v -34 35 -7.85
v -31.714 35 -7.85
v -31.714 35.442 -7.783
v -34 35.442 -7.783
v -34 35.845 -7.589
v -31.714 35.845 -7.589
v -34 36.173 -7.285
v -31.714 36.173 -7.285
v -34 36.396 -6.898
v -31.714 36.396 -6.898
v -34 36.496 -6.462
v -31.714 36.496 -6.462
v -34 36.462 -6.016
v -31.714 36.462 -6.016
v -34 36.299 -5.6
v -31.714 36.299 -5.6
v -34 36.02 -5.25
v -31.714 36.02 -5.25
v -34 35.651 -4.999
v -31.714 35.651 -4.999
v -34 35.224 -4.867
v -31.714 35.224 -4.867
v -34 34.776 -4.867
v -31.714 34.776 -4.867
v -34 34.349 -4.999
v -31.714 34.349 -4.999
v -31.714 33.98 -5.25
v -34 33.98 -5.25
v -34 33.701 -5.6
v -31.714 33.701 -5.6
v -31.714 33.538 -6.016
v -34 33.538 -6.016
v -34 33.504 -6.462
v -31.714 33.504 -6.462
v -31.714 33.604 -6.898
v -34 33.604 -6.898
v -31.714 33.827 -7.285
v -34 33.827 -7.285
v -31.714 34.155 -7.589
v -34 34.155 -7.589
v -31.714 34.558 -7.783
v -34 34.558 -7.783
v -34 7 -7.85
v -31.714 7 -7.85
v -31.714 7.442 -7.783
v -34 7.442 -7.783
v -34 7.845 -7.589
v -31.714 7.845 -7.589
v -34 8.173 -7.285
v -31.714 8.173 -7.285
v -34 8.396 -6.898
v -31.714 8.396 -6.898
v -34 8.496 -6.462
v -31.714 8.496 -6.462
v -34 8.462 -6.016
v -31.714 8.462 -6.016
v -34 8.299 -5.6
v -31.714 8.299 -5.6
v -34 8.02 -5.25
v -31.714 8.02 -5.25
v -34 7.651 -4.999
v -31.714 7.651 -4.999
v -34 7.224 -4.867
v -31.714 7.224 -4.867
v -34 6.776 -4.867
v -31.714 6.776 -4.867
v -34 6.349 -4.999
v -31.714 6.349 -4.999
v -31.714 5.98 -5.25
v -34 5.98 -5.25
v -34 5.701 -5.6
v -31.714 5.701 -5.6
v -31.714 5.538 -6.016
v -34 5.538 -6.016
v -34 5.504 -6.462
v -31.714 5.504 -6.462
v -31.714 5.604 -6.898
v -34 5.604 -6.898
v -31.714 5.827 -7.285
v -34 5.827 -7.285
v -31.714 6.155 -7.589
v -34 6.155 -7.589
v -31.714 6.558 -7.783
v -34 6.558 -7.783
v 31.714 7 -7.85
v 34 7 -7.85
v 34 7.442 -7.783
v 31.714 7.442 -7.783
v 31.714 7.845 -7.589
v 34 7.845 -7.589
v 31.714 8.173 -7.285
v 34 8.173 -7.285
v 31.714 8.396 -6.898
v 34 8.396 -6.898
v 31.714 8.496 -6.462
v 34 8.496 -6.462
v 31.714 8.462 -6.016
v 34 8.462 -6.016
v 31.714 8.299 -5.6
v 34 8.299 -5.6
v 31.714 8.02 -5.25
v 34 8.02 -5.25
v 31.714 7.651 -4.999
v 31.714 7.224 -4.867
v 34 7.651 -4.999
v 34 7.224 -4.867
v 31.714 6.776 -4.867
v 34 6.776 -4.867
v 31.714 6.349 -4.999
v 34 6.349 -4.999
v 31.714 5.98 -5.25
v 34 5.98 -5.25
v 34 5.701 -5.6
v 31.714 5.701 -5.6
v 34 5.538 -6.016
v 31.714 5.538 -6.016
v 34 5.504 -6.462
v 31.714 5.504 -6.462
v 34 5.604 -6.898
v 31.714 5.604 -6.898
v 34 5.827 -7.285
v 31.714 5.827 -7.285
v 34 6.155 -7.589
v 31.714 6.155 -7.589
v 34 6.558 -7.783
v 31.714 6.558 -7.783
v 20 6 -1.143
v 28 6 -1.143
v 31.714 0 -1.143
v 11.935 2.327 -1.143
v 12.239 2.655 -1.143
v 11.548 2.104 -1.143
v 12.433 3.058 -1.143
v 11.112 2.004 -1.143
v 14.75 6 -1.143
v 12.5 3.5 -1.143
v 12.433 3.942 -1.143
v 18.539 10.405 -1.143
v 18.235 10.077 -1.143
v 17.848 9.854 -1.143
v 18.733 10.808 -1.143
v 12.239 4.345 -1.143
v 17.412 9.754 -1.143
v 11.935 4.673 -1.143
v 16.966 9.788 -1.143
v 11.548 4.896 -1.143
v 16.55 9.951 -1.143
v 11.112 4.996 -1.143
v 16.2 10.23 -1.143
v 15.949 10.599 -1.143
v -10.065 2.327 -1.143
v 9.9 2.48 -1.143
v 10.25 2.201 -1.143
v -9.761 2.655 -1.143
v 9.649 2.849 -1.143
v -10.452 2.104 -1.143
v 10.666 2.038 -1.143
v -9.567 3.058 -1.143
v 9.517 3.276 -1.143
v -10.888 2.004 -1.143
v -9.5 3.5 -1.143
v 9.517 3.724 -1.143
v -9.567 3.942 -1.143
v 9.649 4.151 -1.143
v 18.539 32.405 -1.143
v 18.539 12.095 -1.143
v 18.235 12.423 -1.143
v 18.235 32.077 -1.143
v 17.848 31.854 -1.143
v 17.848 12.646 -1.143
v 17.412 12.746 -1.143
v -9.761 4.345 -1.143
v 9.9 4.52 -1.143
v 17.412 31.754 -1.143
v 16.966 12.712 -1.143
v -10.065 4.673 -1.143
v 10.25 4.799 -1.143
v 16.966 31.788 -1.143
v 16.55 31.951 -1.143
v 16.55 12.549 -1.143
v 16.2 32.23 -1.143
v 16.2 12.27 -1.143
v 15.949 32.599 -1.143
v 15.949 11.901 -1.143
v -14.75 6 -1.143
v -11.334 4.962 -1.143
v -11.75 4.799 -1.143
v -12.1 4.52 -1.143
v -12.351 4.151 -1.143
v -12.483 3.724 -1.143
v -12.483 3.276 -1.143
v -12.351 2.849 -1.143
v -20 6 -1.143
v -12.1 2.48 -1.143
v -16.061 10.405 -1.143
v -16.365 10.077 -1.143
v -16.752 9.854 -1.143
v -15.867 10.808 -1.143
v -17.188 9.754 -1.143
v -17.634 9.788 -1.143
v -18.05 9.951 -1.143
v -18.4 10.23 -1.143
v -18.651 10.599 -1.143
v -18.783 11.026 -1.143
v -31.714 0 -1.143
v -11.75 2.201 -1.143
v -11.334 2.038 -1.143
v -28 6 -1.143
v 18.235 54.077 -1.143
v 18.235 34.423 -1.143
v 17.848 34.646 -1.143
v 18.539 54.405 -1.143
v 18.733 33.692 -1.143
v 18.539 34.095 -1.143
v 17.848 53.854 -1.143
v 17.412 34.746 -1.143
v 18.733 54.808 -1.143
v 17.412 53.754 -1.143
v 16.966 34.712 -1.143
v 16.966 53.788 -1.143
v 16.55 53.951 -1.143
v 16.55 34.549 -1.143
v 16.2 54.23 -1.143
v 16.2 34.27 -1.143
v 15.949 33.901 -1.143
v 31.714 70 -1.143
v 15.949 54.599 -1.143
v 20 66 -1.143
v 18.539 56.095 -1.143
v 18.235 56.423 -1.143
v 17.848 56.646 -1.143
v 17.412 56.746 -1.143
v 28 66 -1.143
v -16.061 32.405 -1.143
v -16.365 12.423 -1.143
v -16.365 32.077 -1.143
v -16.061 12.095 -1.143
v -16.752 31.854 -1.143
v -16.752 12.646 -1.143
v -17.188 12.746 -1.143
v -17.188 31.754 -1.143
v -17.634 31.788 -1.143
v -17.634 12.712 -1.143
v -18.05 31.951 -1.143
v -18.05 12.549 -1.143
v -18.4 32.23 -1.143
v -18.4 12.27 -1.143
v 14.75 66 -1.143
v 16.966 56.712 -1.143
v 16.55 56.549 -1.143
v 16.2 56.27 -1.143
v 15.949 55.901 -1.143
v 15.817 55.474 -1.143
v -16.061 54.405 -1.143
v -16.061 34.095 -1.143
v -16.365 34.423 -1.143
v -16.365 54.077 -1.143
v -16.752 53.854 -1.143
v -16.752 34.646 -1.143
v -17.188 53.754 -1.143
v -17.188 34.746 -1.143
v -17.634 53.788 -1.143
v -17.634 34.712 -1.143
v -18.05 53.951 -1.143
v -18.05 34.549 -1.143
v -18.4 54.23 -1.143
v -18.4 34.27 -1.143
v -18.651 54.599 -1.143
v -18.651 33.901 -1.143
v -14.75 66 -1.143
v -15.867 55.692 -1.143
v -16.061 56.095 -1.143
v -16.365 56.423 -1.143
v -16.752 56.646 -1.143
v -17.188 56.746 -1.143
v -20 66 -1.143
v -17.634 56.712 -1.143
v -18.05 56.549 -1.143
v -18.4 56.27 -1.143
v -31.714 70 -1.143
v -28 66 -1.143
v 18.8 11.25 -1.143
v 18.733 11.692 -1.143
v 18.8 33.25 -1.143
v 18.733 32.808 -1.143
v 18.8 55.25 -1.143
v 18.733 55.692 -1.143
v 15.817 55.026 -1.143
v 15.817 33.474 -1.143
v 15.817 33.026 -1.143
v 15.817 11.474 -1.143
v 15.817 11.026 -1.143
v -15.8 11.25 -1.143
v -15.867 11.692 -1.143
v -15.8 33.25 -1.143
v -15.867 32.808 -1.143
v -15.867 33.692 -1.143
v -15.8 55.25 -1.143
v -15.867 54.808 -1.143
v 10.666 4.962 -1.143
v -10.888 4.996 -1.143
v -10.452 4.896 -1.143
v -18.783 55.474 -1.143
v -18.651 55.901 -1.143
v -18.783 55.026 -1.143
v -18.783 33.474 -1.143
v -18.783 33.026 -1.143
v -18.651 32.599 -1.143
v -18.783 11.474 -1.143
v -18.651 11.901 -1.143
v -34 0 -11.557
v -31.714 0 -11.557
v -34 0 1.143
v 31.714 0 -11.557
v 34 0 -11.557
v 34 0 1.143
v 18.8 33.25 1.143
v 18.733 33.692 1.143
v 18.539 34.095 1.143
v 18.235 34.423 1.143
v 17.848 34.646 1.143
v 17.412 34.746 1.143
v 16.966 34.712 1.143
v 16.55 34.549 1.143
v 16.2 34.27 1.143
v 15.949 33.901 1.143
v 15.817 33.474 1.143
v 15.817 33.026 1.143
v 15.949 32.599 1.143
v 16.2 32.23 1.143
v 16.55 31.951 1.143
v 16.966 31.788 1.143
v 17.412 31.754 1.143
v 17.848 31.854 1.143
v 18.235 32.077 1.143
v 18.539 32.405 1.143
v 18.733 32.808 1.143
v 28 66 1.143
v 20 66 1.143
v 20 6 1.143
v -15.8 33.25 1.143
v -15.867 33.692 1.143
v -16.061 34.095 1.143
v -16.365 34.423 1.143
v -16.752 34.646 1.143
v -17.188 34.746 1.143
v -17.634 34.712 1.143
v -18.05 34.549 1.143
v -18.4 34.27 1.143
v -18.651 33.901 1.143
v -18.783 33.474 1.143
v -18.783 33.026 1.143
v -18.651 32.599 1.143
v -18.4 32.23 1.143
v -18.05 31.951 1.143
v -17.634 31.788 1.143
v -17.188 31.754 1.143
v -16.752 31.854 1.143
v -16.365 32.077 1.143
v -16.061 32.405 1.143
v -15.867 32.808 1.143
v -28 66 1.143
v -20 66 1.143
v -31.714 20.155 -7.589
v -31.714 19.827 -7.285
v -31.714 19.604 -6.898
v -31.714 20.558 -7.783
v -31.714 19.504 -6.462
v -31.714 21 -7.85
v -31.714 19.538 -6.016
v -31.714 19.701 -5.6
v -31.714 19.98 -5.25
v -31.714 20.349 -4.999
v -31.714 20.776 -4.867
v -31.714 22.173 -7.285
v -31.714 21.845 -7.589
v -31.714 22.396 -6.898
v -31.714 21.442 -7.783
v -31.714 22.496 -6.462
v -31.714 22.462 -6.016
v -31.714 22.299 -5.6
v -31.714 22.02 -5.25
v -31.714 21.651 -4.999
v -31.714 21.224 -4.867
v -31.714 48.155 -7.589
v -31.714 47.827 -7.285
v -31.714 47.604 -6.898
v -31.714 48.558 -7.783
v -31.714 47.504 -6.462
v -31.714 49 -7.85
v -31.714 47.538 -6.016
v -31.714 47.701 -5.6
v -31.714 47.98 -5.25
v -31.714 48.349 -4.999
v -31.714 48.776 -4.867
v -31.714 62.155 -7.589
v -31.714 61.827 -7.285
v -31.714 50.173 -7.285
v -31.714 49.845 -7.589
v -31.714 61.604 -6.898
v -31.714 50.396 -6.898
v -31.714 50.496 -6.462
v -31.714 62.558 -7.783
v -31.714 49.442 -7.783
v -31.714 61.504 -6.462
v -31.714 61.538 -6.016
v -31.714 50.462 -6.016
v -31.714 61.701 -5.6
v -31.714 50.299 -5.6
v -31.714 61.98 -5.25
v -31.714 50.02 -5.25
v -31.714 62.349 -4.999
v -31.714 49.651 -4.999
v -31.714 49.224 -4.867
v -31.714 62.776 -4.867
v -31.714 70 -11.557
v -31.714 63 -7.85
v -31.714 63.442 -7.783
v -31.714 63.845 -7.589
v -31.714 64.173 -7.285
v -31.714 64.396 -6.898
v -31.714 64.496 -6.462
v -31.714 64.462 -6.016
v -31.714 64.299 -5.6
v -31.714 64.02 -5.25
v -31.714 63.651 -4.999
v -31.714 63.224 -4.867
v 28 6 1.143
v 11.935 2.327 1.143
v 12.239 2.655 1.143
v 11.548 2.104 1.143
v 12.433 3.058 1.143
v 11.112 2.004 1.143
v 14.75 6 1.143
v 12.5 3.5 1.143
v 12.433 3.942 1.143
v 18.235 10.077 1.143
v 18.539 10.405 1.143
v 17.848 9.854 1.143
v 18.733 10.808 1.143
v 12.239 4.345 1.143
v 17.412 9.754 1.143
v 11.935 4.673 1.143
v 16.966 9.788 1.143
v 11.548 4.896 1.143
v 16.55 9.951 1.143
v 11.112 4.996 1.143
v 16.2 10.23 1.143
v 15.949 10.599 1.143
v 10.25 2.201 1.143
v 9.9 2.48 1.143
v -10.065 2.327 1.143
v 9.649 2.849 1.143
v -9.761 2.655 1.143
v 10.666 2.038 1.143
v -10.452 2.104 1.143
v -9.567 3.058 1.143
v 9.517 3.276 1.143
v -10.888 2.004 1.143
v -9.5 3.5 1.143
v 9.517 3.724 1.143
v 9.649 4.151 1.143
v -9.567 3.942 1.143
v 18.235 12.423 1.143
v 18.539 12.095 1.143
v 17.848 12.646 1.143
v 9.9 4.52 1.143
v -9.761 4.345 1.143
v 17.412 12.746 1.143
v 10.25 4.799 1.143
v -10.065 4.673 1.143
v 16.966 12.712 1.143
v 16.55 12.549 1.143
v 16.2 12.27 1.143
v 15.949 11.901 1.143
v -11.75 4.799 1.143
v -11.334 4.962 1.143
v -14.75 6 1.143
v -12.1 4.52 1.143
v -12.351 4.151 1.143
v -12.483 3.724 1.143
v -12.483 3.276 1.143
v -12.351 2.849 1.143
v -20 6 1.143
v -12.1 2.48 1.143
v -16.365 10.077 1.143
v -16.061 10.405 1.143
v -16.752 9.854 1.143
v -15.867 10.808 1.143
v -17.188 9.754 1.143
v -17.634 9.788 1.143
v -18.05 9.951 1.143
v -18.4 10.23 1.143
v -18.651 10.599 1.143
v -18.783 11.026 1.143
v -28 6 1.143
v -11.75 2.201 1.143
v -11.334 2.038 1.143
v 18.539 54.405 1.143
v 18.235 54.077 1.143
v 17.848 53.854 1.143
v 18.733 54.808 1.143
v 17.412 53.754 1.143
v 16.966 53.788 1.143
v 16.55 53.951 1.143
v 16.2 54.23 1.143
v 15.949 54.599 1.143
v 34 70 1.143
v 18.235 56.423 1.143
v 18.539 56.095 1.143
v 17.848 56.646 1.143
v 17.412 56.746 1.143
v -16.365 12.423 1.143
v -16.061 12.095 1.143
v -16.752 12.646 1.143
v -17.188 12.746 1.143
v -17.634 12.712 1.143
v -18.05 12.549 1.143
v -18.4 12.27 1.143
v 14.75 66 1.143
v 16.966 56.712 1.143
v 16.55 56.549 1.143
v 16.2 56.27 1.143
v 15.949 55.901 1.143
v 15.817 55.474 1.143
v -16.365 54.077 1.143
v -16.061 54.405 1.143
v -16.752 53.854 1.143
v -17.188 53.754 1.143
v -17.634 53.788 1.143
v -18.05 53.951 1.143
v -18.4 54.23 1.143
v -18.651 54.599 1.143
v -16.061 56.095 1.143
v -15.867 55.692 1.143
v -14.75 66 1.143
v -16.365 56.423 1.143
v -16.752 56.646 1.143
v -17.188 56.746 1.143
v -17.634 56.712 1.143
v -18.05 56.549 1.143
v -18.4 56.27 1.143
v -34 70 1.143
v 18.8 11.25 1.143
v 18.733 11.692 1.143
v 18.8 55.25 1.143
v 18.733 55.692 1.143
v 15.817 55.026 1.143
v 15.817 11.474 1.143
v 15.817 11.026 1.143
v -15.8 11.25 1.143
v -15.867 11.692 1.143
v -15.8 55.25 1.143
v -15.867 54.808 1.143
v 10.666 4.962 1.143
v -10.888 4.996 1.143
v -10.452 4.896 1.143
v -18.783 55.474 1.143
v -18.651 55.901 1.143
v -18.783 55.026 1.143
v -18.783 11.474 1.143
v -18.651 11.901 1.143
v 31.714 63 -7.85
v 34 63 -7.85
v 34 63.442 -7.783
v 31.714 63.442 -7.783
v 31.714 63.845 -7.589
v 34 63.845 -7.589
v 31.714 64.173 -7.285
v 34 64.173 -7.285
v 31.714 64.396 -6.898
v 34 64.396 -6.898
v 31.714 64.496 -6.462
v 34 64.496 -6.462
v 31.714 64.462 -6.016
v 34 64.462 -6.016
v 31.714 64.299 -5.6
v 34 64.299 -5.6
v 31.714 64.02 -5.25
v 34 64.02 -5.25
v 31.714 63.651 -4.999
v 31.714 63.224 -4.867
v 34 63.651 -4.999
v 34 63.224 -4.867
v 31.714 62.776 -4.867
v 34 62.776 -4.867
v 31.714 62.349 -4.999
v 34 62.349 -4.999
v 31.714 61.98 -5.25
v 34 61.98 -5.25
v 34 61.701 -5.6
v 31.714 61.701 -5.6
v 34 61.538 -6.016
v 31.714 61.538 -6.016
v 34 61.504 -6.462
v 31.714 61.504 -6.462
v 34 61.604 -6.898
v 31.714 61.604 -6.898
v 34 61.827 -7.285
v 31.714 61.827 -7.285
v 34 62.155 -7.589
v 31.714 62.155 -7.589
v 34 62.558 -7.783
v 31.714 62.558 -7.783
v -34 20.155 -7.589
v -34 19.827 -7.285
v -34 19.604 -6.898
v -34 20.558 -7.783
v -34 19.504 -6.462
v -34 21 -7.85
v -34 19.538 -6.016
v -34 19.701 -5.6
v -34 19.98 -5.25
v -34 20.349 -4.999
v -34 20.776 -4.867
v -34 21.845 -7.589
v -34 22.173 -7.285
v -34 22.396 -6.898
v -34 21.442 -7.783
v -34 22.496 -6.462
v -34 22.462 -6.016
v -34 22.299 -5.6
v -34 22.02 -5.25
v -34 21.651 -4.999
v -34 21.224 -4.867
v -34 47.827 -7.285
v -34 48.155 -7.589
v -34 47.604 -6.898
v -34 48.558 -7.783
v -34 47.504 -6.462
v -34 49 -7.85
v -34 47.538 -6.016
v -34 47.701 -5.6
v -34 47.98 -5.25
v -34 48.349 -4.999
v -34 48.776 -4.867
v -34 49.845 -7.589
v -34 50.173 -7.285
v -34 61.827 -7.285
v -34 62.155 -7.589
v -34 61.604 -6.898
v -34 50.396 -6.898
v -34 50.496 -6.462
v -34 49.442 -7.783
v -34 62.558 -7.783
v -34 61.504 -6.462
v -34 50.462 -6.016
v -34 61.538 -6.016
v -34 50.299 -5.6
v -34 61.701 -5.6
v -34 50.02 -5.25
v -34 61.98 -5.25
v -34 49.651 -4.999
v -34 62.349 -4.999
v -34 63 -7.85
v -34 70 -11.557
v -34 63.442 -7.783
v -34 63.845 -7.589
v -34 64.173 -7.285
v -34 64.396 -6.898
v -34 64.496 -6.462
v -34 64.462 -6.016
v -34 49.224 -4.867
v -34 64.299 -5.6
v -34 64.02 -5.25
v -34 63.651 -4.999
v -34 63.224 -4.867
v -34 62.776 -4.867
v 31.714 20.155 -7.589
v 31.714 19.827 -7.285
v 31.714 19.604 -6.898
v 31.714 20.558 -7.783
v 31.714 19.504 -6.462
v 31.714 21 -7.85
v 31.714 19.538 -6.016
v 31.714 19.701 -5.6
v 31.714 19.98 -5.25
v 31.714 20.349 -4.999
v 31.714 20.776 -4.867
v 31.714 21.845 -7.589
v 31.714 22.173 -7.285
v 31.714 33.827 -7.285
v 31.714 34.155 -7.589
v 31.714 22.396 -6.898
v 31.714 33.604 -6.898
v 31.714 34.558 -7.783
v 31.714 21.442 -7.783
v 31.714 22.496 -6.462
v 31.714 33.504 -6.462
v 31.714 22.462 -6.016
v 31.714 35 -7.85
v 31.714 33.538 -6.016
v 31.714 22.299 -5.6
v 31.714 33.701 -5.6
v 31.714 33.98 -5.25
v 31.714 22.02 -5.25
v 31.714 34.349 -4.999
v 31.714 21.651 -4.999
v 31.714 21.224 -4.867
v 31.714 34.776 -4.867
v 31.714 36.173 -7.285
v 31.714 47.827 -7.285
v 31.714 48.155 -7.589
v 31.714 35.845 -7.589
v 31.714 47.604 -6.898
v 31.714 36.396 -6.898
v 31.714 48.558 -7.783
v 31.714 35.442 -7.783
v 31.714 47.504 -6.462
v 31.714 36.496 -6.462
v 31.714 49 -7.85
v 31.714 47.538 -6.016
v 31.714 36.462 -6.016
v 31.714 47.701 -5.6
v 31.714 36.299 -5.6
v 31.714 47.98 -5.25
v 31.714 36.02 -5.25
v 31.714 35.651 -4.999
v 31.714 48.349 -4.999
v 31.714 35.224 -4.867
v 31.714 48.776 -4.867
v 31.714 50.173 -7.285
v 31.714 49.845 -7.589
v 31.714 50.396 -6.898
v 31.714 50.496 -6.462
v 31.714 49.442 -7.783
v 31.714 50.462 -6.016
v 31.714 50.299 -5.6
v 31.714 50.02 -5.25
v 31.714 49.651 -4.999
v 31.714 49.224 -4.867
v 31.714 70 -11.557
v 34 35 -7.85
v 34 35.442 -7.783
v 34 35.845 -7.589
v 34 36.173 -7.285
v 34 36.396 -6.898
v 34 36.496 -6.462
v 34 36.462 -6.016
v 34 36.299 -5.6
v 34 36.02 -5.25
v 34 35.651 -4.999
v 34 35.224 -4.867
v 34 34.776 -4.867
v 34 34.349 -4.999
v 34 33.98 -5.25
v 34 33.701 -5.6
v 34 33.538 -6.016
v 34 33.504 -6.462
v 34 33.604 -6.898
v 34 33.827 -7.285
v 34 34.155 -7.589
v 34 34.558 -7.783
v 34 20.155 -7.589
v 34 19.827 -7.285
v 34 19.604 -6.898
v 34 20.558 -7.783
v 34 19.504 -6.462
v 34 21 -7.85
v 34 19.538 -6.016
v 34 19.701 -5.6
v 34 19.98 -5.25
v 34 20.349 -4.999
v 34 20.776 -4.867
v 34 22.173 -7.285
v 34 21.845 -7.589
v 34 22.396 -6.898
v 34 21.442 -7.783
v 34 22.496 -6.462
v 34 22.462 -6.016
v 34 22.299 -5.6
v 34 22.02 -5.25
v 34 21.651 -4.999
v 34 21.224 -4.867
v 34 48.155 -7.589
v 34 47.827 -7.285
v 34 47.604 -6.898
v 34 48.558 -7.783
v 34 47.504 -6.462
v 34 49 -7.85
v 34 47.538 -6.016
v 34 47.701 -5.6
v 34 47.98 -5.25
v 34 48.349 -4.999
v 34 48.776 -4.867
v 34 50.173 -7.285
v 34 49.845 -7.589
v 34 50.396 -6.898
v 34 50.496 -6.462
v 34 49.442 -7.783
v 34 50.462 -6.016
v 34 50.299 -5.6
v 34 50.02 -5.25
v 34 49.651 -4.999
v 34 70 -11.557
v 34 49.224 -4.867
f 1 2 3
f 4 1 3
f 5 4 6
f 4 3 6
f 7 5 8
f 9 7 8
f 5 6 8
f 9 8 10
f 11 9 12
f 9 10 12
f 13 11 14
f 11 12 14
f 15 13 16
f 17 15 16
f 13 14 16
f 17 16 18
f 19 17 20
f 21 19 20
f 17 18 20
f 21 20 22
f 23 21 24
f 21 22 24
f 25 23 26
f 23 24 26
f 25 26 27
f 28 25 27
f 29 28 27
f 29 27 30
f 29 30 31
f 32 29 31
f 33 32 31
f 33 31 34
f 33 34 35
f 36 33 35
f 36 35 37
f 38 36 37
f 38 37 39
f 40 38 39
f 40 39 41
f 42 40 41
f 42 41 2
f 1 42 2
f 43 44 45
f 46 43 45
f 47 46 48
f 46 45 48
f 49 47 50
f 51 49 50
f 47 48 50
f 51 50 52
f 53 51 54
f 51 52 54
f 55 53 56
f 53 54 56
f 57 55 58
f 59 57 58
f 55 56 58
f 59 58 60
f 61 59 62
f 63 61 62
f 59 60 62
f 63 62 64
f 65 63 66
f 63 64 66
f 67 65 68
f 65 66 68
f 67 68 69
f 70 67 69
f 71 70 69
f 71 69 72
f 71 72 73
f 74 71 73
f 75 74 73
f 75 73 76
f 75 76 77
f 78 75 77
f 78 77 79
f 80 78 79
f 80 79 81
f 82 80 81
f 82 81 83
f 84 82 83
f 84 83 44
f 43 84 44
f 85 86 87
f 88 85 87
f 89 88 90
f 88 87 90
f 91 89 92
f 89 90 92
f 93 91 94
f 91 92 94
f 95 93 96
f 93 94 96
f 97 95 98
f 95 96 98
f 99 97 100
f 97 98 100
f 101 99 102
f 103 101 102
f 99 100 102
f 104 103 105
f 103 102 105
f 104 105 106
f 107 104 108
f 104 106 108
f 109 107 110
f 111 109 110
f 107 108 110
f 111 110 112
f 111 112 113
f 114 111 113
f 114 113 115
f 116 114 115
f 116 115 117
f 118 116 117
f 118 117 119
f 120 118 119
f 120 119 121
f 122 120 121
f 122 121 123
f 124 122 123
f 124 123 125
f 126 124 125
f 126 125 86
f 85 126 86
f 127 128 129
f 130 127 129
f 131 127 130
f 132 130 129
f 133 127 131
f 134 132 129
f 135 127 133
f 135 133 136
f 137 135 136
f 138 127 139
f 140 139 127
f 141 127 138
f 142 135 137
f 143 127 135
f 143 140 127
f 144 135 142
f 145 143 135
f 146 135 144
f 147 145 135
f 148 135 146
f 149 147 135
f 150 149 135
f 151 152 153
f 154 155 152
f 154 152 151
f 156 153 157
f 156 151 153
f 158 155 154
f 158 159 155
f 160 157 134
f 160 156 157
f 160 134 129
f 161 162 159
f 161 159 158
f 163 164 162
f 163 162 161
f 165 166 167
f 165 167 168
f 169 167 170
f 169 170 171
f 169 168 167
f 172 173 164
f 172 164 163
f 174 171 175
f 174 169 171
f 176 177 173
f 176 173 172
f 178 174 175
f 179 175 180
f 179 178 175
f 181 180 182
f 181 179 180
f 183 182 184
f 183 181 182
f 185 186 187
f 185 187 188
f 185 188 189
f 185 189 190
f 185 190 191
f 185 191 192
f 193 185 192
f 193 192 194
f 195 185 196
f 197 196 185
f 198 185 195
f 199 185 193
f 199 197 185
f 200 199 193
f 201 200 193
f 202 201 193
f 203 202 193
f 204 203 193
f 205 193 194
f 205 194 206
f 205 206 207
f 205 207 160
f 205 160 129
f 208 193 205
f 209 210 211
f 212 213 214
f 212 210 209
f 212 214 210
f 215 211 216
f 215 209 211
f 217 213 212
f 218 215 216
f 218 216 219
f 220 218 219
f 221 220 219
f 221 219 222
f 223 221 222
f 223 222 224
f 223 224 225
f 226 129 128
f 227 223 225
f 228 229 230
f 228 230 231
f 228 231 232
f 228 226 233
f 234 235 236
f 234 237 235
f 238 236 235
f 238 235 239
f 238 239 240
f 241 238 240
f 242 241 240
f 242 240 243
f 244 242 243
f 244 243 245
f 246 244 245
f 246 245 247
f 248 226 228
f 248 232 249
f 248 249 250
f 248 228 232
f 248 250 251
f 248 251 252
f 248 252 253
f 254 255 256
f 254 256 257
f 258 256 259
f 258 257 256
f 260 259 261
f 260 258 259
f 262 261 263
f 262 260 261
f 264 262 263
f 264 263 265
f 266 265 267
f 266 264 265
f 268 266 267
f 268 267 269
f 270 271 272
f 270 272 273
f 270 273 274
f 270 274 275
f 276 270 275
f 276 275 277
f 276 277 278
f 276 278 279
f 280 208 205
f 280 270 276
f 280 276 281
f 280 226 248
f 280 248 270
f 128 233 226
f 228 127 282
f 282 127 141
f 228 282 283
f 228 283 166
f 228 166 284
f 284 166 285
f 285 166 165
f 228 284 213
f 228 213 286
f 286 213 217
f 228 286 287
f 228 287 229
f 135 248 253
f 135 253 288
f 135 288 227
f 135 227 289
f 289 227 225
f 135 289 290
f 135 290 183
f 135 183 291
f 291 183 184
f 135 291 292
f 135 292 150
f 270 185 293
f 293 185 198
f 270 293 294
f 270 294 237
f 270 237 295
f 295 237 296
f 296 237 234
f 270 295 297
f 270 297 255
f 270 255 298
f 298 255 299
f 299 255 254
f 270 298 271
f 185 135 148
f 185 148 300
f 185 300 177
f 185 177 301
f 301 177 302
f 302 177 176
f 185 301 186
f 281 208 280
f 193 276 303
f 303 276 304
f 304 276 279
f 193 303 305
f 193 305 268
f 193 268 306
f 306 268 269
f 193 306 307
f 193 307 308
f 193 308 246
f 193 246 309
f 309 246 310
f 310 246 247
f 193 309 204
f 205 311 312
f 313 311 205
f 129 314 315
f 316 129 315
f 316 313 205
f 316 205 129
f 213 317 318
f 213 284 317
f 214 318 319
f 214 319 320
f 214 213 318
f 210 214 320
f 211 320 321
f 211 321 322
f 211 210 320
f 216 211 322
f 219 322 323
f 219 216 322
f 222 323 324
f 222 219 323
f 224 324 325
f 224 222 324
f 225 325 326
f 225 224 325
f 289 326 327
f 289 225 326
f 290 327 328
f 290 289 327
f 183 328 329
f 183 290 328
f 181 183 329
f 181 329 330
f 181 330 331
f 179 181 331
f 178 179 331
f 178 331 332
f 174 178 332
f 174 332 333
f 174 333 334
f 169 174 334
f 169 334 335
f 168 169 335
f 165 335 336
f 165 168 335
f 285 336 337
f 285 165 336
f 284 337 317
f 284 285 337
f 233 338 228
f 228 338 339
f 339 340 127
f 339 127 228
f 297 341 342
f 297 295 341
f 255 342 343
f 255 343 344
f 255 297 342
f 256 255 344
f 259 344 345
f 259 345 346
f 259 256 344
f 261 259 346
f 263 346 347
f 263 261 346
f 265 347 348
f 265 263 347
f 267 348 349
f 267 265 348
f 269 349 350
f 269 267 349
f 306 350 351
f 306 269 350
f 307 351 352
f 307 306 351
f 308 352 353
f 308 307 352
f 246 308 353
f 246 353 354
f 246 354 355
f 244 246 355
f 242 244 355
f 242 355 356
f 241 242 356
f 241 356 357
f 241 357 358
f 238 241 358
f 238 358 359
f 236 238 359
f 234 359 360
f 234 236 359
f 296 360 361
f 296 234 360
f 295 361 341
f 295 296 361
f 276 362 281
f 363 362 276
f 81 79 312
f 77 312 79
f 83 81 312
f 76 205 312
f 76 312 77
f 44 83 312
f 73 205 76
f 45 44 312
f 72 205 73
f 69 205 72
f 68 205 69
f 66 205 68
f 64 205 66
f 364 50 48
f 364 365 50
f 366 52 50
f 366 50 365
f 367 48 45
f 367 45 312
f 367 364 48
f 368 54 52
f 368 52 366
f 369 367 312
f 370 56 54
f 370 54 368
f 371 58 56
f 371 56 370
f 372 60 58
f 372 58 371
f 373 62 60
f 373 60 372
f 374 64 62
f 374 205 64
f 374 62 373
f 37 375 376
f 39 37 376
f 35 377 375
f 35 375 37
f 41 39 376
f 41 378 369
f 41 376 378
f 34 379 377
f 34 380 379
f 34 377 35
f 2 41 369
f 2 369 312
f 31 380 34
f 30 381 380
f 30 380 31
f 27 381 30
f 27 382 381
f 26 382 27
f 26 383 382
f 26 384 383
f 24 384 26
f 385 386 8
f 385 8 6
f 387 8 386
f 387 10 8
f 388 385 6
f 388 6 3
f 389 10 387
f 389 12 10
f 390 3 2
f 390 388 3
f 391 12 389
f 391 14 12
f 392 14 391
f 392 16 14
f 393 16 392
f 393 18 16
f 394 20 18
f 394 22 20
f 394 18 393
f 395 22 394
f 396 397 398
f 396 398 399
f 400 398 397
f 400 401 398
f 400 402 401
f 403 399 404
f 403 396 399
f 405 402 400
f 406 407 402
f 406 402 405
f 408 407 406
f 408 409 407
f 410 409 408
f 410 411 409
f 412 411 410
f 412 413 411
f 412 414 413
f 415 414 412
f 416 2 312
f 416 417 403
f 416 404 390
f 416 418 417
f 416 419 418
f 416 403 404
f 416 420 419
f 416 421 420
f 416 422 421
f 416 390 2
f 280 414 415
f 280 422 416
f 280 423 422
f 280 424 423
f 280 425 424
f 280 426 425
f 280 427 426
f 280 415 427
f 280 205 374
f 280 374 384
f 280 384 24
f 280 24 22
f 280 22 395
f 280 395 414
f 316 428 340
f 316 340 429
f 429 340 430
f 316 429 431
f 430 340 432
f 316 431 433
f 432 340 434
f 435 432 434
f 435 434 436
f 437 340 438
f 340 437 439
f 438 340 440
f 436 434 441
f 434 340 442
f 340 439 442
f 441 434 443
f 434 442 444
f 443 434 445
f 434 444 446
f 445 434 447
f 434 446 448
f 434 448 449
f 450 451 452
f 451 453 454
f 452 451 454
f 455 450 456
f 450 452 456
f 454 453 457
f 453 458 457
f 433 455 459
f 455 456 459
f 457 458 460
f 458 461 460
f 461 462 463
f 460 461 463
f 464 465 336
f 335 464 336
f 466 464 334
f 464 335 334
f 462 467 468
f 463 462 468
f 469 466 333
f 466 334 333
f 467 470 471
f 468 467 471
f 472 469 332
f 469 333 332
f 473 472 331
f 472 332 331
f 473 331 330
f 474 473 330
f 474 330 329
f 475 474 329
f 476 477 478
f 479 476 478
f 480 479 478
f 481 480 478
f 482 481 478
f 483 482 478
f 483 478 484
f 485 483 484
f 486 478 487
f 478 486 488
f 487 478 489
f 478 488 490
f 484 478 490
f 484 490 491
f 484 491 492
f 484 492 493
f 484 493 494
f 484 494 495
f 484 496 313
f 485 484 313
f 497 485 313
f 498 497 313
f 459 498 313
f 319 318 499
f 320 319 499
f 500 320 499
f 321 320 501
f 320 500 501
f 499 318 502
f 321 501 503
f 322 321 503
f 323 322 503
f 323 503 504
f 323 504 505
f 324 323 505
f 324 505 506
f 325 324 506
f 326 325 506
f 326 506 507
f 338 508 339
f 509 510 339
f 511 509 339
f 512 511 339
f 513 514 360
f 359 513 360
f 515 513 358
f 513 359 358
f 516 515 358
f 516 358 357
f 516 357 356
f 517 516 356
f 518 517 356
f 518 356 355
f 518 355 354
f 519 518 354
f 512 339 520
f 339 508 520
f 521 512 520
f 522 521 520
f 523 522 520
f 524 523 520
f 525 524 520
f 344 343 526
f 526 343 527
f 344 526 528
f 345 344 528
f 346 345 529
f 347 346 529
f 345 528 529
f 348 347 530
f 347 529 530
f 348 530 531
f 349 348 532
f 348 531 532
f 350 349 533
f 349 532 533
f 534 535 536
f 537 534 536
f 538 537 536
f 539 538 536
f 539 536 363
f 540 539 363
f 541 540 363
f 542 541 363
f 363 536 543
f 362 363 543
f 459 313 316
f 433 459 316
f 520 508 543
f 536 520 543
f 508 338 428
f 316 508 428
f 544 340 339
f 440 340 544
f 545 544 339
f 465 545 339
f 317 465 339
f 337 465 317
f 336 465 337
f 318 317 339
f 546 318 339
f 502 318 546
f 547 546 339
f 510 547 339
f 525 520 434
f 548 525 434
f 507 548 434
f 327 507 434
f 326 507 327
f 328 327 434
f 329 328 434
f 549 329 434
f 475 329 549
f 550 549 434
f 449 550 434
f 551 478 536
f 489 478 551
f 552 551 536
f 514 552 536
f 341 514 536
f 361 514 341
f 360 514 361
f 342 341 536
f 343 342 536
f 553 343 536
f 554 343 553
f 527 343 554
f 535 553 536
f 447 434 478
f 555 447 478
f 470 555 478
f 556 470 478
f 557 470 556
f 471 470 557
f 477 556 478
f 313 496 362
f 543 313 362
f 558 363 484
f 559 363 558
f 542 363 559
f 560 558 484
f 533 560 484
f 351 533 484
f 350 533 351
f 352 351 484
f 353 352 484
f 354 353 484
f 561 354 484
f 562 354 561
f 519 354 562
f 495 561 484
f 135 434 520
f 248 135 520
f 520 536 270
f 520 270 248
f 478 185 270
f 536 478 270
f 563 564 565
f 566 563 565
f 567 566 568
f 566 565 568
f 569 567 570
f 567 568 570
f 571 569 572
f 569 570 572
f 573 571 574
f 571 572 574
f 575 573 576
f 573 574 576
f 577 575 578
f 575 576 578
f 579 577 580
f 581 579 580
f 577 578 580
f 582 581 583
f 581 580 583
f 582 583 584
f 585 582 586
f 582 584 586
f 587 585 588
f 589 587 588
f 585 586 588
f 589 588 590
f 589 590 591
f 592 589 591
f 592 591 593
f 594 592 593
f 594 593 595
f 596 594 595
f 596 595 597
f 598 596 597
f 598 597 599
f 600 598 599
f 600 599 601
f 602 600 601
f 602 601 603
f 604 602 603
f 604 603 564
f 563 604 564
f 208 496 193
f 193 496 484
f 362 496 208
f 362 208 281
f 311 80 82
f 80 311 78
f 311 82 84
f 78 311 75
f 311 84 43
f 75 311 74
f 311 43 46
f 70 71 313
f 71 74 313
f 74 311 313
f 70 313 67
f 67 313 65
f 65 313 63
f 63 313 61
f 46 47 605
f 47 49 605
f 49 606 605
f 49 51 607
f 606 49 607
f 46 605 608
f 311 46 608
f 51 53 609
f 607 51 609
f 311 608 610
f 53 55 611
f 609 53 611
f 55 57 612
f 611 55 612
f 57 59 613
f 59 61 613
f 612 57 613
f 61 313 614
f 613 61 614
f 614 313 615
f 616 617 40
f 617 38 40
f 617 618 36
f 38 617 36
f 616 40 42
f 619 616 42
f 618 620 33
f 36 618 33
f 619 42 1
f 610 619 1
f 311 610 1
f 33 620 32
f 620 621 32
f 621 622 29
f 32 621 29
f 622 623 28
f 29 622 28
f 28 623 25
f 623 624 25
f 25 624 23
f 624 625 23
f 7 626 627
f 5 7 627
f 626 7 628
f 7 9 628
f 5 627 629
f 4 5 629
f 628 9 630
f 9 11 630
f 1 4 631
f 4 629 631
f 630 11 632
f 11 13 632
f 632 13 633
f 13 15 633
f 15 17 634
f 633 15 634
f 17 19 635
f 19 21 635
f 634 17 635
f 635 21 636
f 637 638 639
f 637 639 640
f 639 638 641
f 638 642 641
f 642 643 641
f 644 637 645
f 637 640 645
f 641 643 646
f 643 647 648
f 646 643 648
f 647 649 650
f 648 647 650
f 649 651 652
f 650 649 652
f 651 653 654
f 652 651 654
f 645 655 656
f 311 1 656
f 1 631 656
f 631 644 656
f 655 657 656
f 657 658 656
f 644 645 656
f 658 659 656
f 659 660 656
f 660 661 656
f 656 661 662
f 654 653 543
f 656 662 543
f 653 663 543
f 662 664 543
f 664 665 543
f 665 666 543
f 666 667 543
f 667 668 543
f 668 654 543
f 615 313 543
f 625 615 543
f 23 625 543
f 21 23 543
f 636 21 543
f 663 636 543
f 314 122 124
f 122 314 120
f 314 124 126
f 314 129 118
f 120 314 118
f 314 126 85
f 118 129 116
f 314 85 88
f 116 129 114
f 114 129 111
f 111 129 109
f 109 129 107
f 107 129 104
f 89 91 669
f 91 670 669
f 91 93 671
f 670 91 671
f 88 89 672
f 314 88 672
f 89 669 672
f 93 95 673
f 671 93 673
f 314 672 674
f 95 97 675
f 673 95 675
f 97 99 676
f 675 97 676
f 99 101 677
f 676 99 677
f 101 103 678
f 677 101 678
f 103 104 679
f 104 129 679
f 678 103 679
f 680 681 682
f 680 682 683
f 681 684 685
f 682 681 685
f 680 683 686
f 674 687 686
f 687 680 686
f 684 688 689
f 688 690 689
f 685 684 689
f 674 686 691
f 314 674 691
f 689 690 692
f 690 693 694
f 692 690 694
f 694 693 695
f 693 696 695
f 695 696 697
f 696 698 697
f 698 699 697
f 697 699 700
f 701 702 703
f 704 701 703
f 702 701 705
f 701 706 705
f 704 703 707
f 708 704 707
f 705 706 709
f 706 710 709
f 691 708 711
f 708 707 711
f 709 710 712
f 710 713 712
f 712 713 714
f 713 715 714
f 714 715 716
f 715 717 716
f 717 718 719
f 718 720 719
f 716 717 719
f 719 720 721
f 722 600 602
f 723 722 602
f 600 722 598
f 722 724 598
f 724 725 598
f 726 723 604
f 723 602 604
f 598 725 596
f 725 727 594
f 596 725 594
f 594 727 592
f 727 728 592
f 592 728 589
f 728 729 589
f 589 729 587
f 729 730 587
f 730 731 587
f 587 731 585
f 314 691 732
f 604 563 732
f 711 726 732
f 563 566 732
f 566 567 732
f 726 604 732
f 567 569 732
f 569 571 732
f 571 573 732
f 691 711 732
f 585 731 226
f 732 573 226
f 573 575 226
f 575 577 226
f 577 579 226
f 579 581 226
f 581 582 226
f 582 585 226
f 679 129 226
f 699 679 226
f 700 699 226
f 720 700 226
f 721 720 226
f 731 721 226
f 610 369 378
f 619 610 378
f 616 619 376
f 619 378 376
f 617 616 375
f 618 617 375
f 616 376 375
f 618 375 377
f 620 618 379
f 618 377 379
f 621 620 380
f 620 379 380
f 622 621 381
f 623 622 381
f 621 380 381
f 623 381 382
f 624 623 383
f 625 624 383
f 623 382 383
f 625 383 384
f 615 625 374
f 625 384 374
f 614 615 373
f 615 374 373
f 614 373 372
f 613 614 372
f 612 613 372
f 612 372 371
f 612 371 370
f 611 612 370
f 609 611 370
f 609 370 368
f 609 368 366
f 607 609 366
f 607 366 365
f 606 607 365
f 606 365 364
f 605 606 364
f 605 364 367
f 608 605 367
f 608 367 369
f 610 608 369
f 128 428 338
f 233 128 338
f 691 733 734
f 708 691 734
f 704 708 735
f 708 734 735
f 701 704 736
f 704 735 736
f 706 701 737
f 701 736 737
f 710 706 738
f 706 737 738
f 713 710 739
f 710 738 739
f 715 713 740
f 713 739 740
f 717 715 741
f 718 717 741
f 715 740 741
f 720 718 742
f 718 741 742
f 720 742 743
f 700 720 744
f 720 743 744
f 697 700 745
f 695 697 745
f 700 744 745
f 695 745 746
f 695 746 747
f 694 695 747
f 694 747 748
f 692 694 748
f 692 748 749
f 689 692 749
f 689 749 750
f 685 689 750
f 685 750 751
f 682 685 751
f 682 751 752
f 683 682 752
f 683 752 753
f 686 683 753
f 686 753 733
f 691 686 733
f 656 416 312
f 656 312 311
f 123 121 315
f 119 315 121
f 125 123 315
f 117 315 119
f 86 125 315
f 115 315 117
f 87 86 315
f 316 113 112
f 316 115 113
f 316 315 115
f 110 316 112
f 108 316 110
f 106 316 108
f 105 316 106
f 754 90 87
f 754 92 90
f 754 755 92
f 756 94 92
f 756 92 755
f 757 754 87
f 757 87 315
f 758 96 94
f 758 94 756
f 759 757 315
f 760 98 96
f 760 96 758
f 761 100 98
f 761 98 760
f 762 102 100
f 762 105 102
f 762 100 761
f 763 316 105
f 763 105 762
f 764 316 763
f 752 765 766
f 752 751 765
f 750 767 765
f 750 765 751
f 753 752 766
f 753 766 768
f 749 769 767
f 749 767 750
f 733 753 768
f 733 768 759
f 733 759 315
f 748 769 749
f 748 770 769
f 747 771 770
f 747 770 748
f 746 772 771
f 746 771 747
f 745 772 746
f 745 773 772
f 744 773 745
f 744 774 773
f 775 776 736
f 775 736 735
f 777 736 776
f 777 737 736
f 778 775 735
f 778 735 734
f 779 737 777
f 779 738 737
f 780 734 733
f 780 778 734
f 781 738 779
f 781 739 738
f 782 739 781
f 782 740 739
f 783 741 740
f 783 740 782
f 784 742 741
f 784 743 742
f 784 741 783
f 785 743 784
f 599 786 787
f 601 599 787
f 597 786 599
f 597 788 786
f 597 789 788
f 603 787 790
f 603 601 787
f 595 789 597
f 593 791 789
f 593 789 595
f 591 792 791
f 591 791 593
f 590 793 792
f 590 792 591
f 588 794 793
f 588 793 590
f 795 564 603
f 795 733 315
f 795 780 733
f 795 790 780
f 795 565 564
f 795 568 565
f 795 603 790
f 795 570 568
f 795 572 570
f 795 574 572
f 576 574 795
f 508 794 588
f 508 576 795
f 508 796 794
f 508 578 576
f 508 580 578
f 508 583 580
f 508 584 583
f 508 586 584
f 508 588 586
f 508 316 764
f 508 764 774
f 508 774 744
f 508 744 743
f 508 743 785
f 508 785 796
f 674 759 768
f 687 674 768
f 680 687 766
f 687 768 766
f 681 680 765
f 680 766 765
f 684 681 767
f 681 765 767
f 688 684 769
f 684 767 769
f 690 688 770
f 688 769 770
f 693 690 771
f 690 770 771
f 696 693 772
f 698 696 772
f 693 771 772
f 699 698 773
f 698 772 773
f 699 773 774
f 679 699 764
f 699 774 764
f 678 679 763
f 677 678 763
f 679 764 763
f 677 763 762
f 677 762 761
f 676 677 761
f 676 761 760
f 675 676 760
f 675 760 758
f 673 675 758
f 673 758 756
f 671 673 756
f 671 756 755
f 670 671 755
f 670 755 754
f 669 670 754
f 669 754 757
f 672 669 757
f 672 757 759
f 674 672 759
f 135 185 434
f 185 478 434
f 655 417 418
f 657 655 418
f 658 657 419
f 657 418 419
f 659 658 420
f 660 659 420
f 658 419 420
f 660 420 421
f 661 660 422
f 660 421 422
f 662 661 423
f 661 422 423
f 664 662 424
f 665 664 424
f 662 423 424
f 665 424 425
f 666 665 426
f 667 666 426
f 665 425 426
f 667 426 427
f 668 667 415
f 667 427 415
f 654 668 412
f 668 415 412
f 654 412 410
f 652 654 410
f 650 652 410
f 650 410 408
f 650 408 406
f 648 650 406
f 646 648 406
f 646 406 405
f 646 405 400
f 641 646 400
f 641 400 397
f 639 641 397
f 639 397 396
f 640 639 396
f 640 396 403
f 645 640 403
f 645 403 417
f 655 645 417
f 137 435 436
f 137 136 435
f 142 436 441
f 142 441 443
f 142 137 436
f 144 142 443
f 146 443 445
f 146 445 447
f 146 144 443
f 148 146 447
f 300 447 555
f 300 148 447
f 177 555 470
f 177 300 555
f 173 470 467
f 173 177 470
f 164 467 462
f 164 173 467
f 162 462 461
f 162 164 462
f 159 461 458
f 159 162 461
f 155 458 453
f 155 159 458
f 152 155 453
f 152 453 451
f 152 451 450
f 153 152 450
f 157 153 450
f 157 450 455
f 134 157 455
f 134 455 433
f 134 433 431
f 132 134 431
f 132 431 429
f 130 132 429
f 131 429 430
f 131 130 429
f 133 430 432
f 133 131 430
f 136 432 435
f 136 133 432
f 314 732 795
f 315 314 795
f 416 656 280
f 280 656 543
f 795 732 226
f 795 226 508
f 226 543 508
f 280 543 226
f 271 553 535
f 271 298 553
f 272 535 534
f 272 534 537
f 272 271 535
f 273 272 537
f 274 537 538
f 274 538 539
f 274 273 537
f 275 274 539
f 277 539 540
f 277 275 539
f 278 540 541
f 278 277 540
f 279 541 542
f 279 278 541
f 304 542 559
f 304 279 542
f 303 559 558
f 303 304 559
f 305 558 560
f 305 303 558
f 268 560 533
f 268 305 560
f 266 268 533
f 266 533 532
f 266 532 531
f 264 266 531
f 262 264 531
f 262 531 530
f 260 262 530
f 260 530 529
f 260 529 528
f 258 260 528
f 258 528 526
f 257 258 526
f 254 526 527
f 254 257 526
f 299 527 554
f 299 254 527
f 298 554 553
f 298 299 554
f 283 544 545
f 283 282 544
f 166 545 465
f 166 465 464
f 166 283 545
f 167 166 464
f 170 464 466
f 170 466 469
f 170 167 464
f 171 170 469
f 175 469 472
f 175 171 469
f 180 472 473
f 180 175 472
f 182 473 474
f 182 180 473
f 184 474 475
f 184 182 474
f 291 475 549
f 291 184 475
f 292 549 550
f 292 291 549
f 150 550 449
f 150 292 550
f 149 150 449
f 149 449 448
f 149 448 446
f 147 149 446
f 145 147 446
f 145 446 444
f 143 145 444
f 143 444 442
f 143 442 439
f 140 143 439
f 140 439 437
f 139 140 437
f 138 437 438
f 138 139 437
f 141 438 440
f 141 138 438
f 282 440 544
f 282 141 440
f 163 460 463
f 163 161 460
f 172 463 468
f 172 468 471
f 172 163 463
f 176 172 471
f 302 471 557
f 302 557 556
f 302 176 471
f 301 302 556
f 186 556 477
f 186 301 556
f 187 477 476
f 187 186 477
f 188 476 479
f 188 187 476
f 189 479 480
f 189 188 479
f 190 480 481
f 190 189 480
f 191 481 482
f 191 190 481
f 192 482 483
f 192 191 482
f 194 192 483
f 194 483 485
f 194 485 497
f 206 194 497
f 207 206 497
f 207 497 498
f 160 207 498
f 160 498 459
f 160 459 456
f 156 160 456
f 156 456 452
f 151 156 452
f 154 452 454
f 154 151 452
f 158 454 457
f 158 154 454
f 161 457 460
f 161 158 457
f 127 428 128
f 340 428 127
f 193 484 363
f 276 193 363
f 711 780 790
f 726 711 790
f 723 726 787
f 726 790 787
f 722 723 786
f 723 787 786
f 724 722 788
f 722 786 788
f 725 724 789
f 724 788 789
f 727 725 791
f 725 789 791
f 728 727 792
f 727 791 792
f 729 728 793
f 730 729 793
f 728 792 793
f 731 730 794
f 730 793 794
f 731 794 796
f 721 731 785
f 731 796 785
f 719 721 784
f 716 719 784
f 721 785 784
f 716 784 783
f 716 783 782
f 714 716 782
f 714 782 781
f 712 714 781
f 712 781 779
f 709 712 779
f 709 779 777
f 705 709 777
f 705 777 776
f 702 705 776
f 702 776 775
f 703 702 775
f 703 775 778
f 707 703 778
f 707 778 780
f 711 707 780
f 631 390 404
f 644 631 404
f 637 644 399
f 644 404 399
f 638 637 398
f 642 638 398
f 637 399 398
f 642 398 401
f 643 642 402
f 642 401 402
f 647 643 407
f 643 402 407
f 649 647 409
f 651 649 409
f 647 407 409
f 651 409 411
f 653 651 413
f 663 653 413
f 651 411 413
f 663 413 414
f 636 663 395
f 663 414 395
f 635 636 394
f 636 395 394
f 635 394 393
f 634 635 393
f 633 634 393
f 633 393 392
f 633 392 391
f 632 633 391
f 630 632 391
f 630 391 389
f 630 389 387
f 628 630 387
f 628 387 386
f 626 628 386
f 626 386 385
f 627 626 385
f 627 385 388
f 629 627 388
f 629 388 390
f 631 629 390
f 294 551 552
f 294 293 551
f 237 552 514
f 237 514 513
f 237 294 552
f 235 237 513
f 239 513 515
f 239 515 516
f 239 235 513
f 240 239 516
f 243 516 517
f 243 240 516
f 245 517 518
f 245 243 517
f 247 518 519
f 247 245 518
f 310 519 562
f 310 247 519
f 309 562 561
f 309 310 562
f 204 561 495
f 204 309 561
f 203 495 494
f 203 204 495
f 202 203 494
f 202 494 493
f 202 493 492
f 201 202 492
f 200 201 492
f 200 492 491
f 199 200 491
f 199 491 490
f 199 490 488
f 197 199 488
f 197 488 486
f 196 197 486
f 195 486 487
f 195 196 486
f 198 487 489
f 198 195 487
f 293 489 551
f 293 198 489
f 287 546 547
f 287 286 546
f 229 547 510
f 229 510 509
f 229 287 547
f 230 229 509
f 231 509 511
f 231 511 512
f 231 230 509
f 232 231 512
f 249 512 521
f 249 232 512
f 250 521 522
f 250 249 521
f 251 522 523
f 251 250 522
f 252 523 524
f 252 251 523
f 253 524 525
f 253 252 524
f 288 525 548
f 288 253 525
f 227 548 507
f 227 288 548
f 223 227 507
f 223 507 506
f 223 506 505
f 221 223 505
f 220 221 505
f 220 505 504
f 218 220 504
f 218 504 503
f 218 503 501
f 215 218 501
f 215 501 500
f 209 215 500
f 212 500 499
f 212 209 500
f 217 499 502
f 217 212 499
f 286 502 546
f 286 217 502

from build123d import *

# Parameters (mm, degrees)
SKETCH1_W             = 41.5
SKETCH1_H             = 70
SKETCH1_R             = 1.5
SKETCH1_W_2           = 29.5
SKETCH1_H_2           = 60
BOSS_EXTRUDE1_DEPTH   = 1.143
SKETCH2_W             = 13.25
SKETCH2_H             = 70
BOSS_EXTRUDE2_DEPTH   = 2.286
SKETCH8_W             = 8
SKETCH8_H             = 60
CUT_EXTRUDE1_DEPTH    = 10
SKETCH9_W             = 2.286
SKETCH9_H             = 70
BOSS_EXTRUDE3_DEPTH   = 10.414
F_3_0MM_DOWEL_HOLE1_D = 3


with BuildPart() as part:
    # Sketch1 → Boss-Extrude1 (new body, symmetric)
    with BuildSketch(Plane.XY):
        with Locations((0, 35)):
            Rectangle(SKETCH1_W, SKETCH1_H)
        with Locations((-17.3, 11.25)):
            Circle(SKETCH1_R, mode=Mode.SUBTRACT)
        with Locations((-11, 3.5)):
            Circle(SKETCH1_R, mode=Mode.SUBTRACT)
        with Locations((-17.3, 33.25)):
            Circle(SKETCH1_R, mode=Mode.SUBTRACT)
        with Locations((-17.3, 55.25)):
            Circle(SKETCH1_R, mode=Mode.SUBTRACT)
        with Locations((17.3, 55.25)):
            Circle(SKETCH1_R, mode=Mode.SUBTRACT)
        with Locations((17.3, 33.25)):
            Circle(SKETCH1_R, mode=Mode.SUBTRACT)
        with Locations((11, 3.5)):
            Circle(SKETCH1_R, mode=Mode.SUBTRACT)
        with Locations((17.3, 11.25)):
            Circle(SKETCH1_R, mode=Mode.SUBTRACT)
        with Locations((0, 36)):
            Rectangle(SKETCH1_W_2, SKETCH1_H_2, mode=Mode.SUBTRACT)
    extrude(amount=BOSS_EXTRUDE1_DEPTH, both=True)

    # Sketch2 → Boss-Extrude2 (add)
    with BuildSketch(Plane.XY.offset(1.143)):
        with Locations((-27.375, 35)):
            Rectangle(SKETCH2_W, SKETCH2_H)
    boss_extrude2 = extrude(amount=-BOSS_EXTRUDE2_DEPTH)

    # Mirror4: Boss-Extrude2 across plane
    add(boss_extrude2.mirror(Plane(origin=(0, 0, 0), x_dir=(0, 0, 1), z_dir=(1, 0, 0))))

    # Sketch8 → Cut-Extrude1 (cut)
    with BuildSketch(Plane.XY.offset(1.143)):
        with Locations((-24, 36)):
            Rectangle(SKETCH8_W, SKETCH8_H)
    cut_extrude1 = extrude(amount=-CUT_EXTRUDE1_DEPTH, mode=Mode.SUBTRACT)

    # Mirror3: Cut-Extrude1 across plane
    add(cut_extrude1.mirror(Plane(origin=(0, 0, 0), x_dir=(0, 0, 1), z_dir=(1, 0, 0))), mode=Mode.SUBTRACT)

    # Sketch9 → Boss-Extrude3 (add)
    with BuildSketch(Plane(origin=(0, 0, -1.143), x_dir=(-1, 0, 0), z_dir=(0, 0, -1))):
        with Locations((32.857, 35)):
            Rectangle(SKETCH9_W, SKETCH9_H)
    boss_extrude3 = extrude(amount=BOSS_EXTRUDE3_DEPTH)

    # Mirror5: Boss-Extrude3 across plane
    add(boss_extrude3.mirror(Plane(origin=(0, 0, 0), x_dir=(0, 0, 1), z_dir=(1, 0, 0))))

    # Ø3.0mm Dowel Hole1 (through all)
    with Locations(Plane.ZY.offset(34)):
        with Locations((-6.35, 35), (-6.35, 21), (-6.35, 49), (-6.35, 63), (-6.35, 7)):
            Hole(F_3_0MM_DOWEL_HOLE1_D / 2)


solid = part.part
